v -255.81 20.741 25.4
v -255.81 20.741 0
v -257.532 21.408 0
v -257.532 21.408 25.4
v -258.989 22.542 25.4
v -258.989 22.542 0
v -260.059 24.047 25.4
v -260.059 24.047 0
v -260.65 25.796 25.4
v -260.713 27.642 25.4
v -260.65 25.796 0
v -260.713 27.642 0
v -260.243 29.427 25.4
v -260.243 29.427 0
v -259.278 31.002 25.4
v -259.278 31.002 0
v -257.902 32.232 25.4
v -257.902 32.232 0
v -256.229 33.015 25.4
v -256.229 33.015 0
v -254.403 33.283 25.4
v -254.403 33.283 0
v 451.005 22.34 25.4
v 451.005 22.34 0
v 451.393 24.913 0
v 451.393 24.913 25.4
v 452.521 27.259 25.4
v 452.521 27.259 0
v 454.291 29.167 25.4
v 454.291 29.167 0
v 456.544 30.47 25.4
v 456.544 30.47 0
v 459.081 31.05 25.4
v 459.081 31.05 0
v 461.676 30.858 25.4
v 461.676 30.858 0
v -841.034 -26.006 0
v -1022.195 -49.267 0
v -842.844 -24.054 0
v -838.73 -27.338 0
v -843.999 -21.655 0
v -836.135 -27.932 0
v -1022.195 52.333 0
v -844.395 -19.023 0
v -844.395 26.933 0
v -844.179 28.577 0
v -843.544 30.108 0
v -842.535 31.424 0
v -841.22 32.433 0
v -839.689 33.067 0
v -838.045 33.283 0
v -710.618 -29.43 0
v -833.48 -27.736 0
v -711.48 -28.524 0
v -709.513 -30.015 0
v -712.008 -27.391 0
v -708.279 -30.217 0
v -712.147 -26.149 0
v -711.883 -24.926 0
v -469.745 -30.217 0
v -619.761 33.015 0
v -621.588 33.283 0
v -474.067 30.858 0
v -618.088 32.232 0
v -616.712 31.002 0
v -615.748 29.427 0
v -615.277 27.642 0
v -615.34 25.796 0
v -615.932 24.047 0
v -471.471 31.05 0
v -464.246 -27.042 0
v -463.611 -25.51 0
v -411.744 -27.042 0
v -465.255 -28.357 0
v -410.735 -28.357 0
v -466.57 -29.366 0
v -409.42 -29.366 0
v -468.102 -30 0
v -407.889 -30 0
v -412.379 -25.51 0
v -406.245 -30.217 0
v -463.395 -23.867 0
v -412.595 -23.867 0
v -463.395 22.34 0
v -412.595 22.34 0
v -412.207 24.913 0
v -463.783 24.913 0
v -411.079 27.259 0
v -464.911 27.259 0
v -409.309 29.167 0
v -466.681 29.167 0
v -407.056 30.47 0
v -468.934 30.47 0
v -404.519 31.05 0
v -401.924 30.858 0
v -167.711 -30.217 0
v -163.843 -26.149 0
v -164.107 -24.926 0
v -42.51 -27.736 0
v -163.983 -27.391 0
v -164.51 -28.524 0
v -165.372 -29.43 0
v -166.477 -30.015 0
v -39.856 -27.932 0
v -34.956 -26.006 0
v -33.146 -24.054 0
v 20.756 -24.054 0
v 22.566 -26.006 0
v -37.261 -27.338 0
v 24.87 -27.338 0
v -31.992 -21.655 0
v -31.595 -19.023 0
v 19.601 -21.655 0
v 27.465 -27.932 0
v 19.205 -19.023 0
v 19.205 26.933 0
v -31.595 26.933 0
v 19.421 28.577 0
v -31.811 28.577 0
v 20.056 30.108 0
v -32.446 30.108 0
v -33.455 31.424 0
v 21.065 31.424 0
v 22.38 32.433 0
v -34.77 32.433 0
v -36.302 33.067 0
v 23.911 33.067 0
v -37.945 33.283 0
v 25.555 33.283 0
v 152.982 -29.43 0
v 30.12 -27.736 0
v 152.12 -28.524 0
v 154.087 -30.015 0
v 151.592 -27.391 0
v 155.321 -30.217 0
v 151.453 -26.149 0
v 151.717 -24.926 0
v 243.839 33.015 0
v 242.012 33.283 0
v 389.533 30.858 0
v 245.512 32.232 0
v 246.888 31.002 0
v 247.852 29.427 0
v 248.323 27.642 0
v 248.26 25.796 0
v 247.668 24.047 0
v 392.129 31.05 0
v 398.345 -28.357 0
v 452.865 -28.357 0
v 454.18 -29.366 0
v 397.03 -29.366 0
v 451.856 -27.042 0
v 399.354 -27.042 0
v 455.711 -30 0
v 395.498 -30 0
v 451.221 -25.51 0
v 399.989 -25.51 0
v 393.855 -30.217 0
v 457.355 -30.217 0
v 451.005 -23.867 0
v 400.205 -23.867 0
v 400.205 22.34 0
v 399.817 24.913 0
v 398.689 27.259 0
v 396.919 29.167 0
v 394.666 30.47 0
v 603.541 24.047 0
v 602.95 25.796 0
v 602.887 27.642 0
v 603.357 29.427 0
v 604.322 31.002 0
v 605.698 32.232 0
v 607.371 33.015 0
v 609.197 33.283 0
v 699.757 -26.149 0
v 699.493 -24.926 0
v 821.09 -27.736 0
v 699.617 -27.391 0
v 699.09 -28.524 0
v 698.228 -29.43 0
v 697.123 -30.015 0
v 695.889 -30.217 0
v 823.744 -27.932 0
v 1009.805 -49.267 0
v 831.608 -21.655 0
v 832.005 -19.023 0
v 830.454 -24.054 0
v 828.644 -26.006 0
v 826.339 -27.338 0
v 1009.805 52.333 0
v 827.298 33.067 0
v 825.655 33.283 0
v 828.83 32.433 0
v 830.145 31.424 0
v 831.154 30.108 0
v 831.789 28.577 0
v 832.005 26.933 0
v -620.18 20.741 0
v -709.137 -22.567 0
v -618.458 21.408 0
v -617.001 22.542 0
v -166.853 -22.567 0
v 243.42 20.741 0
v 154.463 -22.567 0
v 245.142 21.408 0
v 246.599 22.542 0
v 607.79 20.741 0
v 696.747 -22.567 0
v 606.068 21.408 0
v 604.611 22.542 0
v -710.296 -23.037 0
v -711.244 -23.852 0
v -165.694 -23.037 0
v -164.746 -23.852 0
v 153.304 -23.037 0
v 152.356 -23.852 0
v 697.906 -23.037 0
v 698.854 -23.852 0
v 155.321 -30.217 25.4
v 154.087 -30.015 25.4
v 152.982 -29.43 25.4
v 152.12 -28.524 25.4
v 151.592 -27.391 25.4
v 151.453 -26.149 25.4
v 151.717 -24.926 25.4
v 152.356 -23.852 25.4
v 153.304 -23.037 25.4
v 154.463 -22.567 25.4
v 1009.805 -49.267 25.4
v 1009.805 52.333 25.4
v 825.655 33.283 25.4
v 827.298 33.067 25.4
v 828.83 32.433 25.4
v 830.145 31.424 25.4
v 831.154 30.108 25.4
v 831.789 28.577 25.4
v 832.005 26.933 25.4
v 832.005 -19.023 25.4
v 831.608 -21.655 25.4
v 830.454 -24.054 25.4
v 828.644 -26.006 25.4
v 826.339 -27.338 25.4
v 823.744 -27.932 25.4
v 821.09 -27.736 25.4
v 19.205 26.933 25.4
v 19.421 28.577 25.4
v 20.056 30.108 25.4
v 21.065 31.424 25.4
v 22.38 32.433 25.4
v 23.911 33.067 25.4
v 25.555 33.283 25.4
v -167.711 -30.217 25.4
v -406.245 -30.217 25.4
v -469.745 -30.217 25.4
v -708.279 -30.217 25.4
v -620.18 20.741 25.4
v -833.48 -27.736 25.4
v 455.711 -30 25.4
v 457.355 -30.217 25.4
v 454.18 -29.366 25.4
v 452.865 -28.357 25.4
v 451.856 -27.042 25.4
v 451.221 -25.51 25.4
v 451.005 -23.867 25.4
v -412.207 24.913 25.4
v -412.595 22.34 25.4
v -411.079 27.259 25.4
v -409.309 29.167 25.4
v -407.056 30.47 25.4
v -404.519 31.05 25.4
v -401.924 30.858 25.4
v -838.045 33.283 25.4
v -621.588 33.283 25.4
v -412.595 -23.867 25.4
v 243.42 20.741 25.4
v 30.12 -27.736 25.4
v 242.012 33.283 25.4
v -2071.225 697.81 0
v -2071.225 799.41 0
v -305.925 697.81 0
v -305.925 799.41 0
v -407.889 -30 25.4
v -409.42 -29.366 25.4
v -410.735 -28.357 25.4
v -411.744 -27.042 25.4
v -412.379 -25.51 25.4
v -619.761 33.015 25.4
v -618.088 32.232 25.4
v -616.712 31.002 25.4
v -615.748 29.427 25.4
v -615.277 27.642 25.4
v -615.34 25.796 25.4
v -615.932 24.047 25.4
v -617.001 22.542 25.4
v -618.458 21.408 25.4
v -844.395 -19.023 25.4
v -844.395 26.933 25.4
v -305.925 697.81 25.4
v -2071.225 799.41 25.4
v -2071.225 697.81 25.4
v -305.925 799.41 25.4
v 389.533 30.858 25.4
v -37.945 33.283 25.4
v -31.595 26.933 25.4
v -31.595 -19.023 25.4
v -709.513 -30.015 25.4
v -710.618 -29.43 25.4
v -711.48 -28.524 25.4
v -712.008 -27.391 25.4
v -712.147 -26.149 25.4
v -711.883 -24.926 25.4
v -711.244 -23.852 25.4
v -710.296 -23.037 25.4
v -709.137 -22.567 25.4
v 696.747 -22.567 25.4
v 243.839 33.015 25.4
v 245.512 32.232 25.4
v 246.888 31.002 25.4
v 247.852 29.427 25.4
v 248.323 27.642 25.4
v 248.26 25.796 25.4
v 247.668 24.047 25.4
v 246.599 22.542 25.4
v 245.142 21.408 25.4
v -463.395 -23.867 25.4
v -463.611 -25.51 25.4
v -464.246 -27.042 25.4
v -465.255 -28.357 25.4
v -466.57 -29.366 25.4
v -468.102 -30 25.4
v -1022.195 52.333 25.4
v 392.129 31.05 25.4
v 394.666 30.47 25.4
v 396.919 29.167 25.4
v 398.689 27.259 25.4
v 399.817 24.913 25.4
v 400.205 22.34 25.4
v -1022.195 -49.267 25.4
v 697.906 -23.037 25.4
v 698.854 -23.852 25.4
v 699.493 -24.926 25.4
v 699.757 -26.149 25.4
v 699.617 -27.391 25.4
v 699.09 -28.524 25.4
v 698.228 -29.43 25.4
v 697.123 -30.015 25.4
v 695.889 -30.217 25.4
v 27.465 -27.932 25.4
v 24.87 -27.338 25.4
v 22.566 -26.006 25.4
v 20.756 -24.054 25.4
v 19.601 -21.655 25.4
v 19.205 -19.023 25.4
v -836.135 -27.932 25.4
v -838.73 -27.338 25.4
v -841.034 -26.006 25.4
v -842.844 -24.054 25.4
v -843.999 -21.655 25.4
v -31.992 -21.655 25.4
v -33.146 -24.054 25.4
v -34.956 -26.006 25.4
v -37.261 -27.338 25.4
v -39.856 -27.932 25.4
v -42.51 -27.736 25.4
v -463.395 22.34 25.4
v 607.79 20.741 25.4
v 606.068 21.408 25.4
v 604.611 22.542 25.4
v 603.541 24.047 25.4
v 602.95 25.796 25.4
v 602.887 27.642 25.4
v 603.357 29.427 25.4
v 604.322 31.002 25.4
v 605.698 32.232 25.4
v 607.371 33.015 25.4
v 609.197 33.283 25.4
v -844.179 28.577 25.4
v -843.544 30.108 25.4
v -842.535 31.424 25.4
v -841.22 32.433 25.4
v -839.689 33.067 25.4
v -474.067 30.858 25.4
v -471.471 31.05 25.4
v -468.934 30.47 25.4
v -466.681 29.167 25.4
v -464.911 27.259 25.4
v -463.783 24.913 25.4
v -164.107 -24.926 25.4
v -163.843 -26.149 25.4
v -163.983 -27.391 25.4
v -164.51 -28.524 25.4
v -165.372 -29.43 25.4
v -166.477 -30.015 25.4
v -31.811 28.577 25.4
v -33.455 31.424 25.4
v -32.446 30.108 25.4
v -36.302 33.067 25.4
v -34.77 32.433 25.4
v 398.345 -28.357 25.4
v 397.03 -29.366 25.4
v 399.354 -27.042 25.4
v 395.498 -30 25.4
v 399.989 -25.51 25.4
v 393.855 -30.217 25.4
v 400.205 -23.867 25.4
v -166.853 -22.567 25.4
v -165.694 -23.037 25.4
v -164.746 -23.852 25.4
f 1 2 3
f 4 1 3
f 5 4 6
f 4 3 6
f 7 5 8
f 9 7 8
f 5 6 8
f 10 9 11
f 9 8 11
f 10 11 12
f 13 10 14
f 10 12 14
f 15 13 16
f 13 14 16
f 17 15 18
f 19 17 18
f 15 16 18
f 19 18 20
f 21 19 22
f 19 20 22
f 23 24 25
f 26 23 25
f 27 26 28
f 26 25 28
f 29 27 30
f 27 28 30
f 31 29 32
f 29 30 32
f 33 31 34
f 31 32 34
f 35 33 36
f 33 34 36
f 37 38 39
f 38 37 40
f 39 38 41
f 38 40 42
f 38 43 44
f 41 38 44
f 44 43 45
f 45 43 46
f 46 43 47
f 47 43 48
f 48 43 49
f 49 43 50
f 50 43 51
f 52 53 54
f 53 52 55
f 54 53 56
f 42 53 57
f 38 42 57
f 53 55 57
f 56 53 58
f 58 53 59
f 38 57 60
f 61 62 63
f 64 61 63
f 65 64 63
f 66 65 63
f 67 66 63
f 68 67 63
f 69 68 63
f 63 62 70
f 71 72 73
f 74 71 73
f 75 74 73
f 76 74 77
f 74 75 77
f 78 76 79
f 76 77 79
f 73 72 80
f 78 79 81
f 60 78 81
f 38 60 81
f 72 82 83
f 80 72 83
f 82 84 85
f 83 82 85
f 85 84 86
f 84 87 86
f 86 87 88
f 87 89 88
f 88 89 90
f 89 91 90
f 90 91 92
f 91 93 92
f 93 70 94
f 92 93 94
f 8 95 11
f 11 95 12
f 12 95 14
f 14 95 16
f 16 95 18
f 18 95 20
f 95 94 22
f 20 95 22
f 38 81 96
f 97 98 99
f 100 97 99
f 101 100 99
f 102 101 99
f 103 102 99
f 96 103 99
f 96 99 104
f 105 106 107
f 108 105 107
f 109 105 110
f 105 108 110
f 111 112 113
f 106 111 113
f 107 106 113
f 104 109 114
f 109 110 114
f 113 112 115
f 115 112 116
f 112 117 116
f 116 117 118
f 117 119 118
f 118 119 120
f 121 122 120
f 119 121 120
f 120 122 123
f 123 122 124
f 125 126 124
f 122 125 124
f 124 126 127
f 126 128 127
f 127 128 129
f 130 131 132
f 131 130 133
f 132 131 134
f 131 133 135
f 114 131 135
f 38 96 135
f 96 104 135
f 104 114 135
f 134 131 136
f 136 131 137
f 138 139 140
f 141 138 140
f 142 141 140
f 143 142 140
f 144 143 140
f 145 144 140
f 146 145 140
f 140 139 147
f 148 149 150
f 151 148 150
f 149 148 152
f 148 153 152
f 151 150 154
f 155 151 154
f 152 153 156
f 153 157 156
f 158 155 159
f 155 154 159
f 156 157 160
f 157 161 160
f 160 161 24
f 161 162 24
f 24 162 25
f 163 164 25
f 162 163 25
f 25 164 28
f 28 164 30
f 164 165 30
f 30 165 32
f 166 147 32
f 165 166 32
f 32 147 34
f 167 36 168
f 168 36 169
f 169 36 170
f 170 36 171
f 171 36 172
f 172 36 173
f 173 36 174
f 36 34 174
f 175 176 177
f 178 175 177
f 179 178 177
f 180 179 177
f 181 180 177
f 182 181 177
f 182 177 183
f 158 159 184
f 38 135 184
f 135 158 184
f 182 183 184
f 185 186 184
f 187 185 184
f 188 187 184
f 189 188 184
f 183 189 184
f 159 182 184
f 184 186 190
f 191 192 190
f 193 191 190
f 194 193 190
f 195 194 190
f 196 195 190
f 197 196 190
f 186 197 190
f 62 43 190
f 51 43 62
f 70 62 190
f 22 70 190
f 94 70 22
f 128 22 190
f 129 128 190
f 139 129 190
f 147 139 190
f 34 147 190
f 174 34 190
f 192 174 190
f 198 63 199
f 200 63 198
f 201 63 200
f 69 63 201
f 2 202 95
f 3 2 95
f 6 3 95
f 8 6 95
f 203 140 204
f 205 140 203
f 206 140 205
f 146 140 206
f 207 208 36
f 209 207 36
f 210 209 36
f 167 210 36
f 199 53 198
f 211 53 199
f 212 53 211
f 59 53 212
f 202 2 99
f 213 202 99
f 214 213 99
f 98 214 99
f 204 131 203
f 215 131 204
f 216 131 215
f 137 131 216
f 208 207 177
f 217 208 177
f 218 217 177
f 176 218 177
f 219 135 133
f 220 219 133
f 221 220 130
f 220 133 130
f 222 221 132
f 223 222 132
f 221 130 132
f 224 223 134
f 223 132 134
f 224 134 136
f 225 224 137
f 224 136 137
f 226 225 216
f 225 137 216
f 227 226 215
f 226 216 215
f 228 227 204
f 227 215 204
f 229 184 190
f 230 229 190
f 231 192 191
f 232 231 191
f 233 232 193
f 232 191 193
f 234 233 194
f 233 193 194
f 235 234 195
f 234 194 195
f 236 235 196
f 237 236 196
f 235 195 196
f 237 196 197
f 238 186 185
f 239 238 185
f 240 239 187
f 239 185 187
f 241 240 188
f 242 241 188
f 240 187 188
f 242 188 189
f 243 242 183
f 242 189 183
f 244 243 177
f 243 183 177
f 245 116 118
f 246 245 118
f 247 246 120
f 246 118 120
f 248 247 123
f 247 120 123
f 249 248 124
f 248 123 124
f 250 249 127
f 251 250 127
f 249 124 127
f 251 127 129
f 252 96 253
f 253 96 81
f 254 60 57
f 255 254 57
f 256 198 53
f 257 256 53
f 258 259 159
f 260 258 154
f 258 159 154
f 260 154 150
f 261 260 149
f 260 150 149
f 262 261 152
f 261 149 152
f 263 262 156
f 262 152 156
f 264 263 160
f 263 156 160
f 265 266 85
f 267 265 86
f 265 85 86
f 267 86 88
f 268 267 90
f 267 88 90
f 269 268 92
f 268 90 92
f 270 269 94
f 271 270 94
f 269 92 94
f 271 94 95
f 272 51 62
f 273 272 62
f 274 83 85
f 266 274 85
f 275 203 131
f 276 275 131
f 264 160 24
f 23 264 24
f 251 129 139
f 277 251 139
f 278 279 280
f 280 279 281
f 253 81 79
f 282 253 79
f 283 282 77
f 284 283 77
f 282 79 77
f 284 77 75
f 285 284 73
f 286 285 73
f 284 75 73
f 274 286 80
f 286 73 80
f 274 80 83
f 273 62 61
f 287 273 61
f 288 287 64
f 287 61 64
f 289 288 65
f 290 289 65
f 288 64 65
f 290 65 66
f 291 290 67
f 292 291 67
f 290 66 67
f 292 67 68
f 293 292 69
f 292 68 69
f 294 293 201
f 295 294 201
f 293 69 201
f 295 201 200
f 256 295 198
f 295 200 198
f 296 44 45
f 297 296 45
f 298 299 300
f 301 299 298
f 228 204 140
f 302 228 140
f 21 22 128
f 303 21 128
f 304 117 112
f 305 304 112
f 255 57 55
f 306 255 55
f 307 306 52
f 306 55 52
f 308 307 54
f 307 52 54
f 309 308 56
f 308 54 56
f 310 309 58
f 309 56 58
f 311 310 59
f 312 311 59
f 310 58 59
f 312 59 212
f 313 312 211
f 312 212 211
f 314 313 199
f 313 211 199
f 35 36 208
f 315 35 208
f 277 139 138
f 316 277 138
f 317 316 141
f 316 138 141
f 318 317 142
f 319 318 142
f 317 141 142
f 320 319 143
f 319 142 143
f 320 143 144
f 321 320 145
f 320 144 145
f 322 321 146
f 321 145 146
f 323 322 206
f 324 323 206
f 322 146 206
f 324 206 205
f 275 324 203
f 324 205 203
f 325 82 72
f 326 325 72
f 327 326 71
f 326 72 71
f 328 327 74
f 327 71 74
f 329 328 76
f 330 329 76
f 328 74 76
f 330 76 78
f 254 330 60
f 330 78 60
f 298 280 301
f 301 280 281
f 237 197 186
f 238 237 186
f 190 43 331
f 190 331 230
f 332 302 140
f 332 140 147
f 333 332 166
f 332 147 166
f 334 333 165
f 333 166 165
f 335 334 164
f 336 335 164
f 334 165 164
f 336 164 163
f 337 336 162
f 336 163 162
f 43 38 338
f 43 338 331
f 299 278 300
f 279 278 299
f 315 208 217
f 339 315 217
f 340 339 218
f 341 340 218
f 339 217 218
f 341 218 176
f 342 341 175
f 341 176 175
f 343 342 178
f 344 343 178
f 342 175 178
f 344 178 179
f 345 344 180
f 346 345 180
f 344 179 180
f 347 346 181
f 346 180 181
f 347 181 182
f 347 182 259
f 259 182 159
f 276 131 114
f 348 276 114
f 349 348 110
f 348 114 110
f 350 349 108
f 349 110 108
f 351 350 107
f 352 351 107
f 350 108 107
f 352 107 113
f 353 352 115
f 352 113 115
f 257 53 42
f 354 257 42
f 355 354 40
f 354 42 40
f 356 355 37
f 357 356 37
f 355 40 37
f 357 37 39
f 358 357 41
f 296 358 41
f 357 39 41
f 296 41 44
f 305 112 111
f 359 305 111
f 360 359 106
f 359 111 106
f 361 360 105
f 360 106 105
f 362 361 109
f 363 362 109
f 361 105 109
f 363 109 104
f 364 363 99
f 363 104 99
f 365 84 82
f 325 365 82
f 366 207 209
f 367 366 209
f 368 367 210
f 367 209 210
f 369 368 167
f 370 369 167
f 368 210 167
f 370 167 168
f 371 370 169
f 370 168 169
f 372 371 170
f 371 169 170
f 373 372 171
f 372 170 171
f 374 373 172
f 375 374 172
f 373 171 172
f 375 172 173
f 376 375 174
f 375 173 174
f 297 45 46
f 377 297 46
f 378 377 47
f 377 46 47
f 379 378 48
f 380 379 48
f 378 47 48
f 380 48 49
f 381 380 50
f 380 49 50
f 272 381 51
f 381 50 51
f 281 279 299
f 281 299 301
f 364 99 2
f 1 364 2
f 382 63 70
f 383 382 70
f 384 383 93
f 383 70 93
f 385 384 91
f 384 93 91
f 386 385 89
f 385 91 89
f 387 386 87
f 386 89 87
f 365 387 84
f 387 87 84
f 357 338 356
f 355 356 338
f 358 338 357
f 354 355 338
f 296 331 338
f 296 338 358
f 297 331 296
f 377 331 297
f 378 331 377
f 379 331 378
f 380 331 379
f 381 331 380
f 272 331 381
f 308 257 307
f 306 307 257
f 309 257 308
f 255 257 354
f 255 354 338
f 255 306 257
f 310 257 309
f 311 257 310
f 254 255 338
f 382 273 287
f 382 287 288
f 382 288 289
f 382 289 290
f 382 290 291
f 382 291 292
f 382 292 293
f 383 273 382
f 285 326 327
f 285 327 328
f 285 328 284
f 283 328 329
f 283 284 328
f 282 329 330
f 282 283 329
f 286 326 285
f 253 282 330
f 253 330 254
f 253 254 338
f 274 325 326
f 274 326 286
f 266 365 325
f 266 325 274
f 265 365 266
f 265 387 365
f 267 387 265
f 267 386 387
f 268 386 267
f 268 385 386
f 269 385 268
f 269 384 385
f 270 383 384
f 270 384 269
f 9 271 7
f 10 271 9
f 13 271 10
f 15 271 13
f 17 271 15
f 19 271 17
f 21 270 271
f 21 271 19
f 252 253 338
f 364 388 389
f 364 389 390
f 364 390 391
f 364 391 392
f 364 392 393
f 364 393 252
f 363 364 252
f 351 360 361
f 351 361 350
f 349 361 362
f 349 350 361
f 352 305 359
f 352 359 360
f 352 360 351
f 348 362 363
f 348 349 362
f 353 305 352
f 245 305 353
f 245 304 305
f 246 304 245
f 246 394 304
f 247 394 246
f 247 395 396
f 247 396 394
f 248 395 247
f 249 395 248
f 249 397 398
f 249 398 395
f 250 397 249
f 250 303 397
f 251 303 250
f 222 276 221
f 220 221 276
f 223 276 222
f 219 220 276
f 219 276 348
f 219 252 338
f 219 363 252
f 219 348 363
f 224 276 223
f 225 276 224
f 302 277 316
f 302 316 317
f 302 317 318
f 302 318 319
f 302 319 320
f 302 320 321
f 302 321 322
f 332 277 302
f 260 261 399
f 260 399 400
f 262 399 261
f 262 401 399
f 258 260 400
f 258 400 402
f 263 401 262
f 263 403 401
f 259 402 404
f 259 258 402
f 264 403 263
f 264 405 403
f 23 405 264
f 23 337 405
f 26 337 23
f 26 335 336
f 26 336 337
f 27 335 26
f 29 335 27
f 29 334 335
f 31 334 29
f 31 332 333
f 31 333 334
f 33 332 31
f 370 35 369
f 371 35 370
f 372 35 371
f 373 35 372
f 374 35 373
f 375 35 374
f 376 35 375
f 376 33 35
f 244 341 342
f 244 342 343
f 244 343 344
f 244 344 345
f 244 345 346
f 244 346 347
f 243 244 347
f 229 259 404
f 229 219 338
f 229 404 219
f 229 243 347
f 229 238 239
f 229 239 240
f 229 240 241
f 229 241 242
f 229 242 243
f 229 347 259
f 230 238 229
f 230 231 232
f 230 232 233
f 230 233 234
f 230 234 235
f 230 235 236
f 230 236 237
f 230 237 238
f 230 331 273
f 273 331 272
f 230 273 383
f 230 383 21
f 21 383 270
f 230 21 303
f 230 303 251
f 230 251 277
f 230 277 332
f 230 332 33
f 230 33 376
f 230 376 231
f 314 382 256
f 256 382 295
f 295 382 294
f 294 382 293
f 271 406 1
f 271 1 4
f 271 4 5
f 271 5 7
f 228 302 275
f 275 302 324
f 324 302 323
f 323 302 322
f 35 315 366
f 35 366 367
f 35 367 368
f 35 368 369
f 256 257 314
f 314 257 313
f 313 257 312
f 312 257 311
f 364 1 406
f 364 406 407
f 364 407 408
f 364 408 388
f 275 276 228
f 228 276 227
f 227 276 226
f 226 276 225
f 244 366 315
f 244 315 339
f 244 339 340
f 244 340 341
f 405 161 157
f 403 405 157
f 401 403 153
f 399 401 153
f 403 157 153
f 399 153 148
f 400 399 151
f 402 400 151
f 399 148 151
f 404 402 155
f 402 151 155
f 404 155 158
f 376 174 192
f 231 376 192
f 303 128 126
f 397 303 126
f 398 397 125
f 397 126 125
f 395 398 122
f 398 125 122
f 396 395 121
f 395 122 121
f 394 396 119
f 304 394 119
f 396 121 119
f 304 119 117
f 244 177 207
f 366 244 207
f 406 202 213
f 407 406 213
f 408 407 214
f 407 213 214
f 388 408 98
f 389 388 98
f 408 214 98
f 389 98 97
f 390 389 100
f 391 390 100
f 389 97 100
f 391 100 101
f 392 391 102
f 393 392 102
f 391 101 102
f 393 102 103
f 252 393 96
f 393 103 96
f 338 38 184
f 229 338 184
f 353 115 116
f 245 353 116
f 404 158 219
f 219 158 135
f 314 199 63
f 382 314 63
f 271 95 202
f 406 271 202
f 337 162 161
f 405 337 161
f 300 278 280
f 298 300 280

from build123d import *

# Parameters (mm, degrees)
F0_W     = 2032
F0_H     = 101.6
F1_DEPTH = 25.4
F0_W_2   = 1765.3
F2_DEPTH = 25.4


with BuildPart() as f1:
    # F0 (on Top) → F1 (new body)
    with BuildSketch(Plane.XY):
        with Locations((-6.195122, 1.533477)):
            Rectangle(F0_W, F0_H)
        with BuildLine():
            ThreePointArc((-833.479996, -27.735812), (-841.034244, -26.006102), (-844.395122, -19.023047))
            Line((-844.395122, -19.023047), (-844.395122, 26.933477))
            ThreePointArc((-844.395122, 26.933477), (-842.53525, 31.423605), (-838.045122, 33.283477))
            Line((-838.045122, 33.283477), (-621.587628, 33.283477))
            ThreePointArc((-621.587628, 33.283477), (-615.277228, 27.64154), (-620.180334, 20.741384))
            Line((-620.180334, 20.741384), (-833.479996, -27.735812))
        make_face(mode=Mode.SUBTRACT)
        with BuildLine():
            ThreePointArc((-463.395122, -23.866523), (-465.254994, -28.356651), (-469.745122, -30.216523))
            Line((-469.745122, -30.216523), (-708.279154, -30.216523))
            ThreePointArc((-708.279154, -30.216523), (-712.127889, -26.775485), (-709.137468, -22.567056))
            Line((-709.137468, -22.567056), (-474.066558, 30.858151))
            ThreePointArc((-474.066558, 30.858151), (-466.680965, 29.167058), (-463.395122, 22.339906))
            Line((-463.395122, 22.339906), (-463.395122, -23.866523))
        make_face(mode=Mode.SUBTRACT)
        with BuildLine():
            Line((-401.923686, 30.858151), (-166.852776, -22.567056))
            ThreePointArc((-166.852776, -22.567056), (-163.862355, -26.775485), (-167.71109, -30.216523))
            Line((-167.71109, -30.216523), (-406.245122, -30.216523))
            ThreePointArc((-406.245122, -30.216523), (-410.73525, -28.356651), (-412.595122, -23.866523))
            Line((-412.595122, -23.866523), (-412.595122, 22.339906))
            ThreePointArc((-412.595122, 22.339906), (-409.309279, 29.167058), (-401.923686, 30.858151))
        make_face(mode=Mode.SUBTRACT)
        with BuildLine():
            Line((-254.402616, 33.283477), (-37.945122, 33.283477))
            ThreePointArc((-37.945122, 33.283477), (-33.454994, 31.423605), (-31.595122, 26.933477))
            Line((-31.595122, 26.933477), (-31.595122, -19.023047))
            ThreePointArc((-31.595122, -19.023047), (-34.956, -26.006102), (-42.510248, -27.735812))
            Line((-42.510248, -27.735812), (-255.80991, 20.741384))
            ThreePointArc((-255.80991, 20.741384), (-260.713016, 27.64154), (-254.402616, 33.283477))
        make_face(mode=Mode.SUBTRACT)
        with BuildLine():
            Line((19.204878, -19.023047), (19.204878, 26.933477))
            ThreePointArc((19.204878, 26.933477), (21.06475, 31.423605), (25.554878, 33.283477))
            Line((25.554878, 33.283477), (242.012372, 33.283477))
            ThreePointArc((242.012372, 33.283477), (248.322772, 27.64154), (243.419666, 20.741384))
            Line((243.419666, 20.741384), (30.120004, -27.735812))
            ThreePointArc((30.120004, -27.735812), (22.565756, -26.006102), (19.204878, -19.023047))
        make_face(mode=Mode.SUBTRACT)
        with BuildLine():
            ThreePointArc((389.533442, 30.858151), (396.919035, 29.167058), (400.204878, 22.339906))
            Line((400.204878, 22.339906), (400.204878, -23.866523))
            ThreePointArc((400.204878, -23.866523), (398.345006, -28.356651), (393.854878, -30.216523))
            Line((393.854878, -30.216523), (155.320846, -30.216523))
            ThreePointArc((155.320846, -30.216523), (151.472111, -26.775485), (154.462532, -22.567056))
            Line((154.462532, -22.567056), (389.533442, 30.858151))
        make_face(mode=Mode.SUBTRACT)
        with BuildLine():
            Line((695.88891, -30.216523), (457.354878, -30.216523))
            ThreePointArc((457.354878, -30.216523), (452.86475, -28.356651), (451.004878, -23.866523))
            Line((451.004878, -23.866523), (451.004878, 22.339906))
            ThreePointArc((451.004878, 22.339906), (454.290721, 29.167058), (461.676314, 30.858151))
            Line((461.676314, 30.858151), (696.747224, -22.567056))
            ThreePointArc((696.747224, -22.567056), (699.737645, -26.775485), (695.88891, -30.216523))
        make_face(mode=Mode.SUBTRACT)
        with BuildLine():
            Line((832.004878, 26.933477), (832.004878, -19.023047))
            ThreePointArc((832.004878, -19.023047), (828.644, -26.006102), (821.089752, -27.735812))
            Line((821.089752, -27.735812), (607.79009, 20.741384))
            ThreePointArc((607.79009, 20.741384), (602.886984, 27.64154), (609.197384, 33.283477))
            Line((609.197384, 33.283477), (825.654878, 33.283477))
            ThreePointArc((825.654878, 33.283477), (830.145006, 31.423605), (832.004878, 26.933477))
        make_face(mode=Mode.SUBTRACT)
    extrude(amount=F1_DEPTH)


with BuildPart() as f2:
    # F0 (on Top) → F2 (new body)
    with BuildSketch(Plane.XY):
        with Locations((-1188.575275, 748.610221)):
            Rectangle(F0_W_2, F0_H)
    extrude(amount=F2_DEPTH)


solid = Compound([f1.part, f2.part])
